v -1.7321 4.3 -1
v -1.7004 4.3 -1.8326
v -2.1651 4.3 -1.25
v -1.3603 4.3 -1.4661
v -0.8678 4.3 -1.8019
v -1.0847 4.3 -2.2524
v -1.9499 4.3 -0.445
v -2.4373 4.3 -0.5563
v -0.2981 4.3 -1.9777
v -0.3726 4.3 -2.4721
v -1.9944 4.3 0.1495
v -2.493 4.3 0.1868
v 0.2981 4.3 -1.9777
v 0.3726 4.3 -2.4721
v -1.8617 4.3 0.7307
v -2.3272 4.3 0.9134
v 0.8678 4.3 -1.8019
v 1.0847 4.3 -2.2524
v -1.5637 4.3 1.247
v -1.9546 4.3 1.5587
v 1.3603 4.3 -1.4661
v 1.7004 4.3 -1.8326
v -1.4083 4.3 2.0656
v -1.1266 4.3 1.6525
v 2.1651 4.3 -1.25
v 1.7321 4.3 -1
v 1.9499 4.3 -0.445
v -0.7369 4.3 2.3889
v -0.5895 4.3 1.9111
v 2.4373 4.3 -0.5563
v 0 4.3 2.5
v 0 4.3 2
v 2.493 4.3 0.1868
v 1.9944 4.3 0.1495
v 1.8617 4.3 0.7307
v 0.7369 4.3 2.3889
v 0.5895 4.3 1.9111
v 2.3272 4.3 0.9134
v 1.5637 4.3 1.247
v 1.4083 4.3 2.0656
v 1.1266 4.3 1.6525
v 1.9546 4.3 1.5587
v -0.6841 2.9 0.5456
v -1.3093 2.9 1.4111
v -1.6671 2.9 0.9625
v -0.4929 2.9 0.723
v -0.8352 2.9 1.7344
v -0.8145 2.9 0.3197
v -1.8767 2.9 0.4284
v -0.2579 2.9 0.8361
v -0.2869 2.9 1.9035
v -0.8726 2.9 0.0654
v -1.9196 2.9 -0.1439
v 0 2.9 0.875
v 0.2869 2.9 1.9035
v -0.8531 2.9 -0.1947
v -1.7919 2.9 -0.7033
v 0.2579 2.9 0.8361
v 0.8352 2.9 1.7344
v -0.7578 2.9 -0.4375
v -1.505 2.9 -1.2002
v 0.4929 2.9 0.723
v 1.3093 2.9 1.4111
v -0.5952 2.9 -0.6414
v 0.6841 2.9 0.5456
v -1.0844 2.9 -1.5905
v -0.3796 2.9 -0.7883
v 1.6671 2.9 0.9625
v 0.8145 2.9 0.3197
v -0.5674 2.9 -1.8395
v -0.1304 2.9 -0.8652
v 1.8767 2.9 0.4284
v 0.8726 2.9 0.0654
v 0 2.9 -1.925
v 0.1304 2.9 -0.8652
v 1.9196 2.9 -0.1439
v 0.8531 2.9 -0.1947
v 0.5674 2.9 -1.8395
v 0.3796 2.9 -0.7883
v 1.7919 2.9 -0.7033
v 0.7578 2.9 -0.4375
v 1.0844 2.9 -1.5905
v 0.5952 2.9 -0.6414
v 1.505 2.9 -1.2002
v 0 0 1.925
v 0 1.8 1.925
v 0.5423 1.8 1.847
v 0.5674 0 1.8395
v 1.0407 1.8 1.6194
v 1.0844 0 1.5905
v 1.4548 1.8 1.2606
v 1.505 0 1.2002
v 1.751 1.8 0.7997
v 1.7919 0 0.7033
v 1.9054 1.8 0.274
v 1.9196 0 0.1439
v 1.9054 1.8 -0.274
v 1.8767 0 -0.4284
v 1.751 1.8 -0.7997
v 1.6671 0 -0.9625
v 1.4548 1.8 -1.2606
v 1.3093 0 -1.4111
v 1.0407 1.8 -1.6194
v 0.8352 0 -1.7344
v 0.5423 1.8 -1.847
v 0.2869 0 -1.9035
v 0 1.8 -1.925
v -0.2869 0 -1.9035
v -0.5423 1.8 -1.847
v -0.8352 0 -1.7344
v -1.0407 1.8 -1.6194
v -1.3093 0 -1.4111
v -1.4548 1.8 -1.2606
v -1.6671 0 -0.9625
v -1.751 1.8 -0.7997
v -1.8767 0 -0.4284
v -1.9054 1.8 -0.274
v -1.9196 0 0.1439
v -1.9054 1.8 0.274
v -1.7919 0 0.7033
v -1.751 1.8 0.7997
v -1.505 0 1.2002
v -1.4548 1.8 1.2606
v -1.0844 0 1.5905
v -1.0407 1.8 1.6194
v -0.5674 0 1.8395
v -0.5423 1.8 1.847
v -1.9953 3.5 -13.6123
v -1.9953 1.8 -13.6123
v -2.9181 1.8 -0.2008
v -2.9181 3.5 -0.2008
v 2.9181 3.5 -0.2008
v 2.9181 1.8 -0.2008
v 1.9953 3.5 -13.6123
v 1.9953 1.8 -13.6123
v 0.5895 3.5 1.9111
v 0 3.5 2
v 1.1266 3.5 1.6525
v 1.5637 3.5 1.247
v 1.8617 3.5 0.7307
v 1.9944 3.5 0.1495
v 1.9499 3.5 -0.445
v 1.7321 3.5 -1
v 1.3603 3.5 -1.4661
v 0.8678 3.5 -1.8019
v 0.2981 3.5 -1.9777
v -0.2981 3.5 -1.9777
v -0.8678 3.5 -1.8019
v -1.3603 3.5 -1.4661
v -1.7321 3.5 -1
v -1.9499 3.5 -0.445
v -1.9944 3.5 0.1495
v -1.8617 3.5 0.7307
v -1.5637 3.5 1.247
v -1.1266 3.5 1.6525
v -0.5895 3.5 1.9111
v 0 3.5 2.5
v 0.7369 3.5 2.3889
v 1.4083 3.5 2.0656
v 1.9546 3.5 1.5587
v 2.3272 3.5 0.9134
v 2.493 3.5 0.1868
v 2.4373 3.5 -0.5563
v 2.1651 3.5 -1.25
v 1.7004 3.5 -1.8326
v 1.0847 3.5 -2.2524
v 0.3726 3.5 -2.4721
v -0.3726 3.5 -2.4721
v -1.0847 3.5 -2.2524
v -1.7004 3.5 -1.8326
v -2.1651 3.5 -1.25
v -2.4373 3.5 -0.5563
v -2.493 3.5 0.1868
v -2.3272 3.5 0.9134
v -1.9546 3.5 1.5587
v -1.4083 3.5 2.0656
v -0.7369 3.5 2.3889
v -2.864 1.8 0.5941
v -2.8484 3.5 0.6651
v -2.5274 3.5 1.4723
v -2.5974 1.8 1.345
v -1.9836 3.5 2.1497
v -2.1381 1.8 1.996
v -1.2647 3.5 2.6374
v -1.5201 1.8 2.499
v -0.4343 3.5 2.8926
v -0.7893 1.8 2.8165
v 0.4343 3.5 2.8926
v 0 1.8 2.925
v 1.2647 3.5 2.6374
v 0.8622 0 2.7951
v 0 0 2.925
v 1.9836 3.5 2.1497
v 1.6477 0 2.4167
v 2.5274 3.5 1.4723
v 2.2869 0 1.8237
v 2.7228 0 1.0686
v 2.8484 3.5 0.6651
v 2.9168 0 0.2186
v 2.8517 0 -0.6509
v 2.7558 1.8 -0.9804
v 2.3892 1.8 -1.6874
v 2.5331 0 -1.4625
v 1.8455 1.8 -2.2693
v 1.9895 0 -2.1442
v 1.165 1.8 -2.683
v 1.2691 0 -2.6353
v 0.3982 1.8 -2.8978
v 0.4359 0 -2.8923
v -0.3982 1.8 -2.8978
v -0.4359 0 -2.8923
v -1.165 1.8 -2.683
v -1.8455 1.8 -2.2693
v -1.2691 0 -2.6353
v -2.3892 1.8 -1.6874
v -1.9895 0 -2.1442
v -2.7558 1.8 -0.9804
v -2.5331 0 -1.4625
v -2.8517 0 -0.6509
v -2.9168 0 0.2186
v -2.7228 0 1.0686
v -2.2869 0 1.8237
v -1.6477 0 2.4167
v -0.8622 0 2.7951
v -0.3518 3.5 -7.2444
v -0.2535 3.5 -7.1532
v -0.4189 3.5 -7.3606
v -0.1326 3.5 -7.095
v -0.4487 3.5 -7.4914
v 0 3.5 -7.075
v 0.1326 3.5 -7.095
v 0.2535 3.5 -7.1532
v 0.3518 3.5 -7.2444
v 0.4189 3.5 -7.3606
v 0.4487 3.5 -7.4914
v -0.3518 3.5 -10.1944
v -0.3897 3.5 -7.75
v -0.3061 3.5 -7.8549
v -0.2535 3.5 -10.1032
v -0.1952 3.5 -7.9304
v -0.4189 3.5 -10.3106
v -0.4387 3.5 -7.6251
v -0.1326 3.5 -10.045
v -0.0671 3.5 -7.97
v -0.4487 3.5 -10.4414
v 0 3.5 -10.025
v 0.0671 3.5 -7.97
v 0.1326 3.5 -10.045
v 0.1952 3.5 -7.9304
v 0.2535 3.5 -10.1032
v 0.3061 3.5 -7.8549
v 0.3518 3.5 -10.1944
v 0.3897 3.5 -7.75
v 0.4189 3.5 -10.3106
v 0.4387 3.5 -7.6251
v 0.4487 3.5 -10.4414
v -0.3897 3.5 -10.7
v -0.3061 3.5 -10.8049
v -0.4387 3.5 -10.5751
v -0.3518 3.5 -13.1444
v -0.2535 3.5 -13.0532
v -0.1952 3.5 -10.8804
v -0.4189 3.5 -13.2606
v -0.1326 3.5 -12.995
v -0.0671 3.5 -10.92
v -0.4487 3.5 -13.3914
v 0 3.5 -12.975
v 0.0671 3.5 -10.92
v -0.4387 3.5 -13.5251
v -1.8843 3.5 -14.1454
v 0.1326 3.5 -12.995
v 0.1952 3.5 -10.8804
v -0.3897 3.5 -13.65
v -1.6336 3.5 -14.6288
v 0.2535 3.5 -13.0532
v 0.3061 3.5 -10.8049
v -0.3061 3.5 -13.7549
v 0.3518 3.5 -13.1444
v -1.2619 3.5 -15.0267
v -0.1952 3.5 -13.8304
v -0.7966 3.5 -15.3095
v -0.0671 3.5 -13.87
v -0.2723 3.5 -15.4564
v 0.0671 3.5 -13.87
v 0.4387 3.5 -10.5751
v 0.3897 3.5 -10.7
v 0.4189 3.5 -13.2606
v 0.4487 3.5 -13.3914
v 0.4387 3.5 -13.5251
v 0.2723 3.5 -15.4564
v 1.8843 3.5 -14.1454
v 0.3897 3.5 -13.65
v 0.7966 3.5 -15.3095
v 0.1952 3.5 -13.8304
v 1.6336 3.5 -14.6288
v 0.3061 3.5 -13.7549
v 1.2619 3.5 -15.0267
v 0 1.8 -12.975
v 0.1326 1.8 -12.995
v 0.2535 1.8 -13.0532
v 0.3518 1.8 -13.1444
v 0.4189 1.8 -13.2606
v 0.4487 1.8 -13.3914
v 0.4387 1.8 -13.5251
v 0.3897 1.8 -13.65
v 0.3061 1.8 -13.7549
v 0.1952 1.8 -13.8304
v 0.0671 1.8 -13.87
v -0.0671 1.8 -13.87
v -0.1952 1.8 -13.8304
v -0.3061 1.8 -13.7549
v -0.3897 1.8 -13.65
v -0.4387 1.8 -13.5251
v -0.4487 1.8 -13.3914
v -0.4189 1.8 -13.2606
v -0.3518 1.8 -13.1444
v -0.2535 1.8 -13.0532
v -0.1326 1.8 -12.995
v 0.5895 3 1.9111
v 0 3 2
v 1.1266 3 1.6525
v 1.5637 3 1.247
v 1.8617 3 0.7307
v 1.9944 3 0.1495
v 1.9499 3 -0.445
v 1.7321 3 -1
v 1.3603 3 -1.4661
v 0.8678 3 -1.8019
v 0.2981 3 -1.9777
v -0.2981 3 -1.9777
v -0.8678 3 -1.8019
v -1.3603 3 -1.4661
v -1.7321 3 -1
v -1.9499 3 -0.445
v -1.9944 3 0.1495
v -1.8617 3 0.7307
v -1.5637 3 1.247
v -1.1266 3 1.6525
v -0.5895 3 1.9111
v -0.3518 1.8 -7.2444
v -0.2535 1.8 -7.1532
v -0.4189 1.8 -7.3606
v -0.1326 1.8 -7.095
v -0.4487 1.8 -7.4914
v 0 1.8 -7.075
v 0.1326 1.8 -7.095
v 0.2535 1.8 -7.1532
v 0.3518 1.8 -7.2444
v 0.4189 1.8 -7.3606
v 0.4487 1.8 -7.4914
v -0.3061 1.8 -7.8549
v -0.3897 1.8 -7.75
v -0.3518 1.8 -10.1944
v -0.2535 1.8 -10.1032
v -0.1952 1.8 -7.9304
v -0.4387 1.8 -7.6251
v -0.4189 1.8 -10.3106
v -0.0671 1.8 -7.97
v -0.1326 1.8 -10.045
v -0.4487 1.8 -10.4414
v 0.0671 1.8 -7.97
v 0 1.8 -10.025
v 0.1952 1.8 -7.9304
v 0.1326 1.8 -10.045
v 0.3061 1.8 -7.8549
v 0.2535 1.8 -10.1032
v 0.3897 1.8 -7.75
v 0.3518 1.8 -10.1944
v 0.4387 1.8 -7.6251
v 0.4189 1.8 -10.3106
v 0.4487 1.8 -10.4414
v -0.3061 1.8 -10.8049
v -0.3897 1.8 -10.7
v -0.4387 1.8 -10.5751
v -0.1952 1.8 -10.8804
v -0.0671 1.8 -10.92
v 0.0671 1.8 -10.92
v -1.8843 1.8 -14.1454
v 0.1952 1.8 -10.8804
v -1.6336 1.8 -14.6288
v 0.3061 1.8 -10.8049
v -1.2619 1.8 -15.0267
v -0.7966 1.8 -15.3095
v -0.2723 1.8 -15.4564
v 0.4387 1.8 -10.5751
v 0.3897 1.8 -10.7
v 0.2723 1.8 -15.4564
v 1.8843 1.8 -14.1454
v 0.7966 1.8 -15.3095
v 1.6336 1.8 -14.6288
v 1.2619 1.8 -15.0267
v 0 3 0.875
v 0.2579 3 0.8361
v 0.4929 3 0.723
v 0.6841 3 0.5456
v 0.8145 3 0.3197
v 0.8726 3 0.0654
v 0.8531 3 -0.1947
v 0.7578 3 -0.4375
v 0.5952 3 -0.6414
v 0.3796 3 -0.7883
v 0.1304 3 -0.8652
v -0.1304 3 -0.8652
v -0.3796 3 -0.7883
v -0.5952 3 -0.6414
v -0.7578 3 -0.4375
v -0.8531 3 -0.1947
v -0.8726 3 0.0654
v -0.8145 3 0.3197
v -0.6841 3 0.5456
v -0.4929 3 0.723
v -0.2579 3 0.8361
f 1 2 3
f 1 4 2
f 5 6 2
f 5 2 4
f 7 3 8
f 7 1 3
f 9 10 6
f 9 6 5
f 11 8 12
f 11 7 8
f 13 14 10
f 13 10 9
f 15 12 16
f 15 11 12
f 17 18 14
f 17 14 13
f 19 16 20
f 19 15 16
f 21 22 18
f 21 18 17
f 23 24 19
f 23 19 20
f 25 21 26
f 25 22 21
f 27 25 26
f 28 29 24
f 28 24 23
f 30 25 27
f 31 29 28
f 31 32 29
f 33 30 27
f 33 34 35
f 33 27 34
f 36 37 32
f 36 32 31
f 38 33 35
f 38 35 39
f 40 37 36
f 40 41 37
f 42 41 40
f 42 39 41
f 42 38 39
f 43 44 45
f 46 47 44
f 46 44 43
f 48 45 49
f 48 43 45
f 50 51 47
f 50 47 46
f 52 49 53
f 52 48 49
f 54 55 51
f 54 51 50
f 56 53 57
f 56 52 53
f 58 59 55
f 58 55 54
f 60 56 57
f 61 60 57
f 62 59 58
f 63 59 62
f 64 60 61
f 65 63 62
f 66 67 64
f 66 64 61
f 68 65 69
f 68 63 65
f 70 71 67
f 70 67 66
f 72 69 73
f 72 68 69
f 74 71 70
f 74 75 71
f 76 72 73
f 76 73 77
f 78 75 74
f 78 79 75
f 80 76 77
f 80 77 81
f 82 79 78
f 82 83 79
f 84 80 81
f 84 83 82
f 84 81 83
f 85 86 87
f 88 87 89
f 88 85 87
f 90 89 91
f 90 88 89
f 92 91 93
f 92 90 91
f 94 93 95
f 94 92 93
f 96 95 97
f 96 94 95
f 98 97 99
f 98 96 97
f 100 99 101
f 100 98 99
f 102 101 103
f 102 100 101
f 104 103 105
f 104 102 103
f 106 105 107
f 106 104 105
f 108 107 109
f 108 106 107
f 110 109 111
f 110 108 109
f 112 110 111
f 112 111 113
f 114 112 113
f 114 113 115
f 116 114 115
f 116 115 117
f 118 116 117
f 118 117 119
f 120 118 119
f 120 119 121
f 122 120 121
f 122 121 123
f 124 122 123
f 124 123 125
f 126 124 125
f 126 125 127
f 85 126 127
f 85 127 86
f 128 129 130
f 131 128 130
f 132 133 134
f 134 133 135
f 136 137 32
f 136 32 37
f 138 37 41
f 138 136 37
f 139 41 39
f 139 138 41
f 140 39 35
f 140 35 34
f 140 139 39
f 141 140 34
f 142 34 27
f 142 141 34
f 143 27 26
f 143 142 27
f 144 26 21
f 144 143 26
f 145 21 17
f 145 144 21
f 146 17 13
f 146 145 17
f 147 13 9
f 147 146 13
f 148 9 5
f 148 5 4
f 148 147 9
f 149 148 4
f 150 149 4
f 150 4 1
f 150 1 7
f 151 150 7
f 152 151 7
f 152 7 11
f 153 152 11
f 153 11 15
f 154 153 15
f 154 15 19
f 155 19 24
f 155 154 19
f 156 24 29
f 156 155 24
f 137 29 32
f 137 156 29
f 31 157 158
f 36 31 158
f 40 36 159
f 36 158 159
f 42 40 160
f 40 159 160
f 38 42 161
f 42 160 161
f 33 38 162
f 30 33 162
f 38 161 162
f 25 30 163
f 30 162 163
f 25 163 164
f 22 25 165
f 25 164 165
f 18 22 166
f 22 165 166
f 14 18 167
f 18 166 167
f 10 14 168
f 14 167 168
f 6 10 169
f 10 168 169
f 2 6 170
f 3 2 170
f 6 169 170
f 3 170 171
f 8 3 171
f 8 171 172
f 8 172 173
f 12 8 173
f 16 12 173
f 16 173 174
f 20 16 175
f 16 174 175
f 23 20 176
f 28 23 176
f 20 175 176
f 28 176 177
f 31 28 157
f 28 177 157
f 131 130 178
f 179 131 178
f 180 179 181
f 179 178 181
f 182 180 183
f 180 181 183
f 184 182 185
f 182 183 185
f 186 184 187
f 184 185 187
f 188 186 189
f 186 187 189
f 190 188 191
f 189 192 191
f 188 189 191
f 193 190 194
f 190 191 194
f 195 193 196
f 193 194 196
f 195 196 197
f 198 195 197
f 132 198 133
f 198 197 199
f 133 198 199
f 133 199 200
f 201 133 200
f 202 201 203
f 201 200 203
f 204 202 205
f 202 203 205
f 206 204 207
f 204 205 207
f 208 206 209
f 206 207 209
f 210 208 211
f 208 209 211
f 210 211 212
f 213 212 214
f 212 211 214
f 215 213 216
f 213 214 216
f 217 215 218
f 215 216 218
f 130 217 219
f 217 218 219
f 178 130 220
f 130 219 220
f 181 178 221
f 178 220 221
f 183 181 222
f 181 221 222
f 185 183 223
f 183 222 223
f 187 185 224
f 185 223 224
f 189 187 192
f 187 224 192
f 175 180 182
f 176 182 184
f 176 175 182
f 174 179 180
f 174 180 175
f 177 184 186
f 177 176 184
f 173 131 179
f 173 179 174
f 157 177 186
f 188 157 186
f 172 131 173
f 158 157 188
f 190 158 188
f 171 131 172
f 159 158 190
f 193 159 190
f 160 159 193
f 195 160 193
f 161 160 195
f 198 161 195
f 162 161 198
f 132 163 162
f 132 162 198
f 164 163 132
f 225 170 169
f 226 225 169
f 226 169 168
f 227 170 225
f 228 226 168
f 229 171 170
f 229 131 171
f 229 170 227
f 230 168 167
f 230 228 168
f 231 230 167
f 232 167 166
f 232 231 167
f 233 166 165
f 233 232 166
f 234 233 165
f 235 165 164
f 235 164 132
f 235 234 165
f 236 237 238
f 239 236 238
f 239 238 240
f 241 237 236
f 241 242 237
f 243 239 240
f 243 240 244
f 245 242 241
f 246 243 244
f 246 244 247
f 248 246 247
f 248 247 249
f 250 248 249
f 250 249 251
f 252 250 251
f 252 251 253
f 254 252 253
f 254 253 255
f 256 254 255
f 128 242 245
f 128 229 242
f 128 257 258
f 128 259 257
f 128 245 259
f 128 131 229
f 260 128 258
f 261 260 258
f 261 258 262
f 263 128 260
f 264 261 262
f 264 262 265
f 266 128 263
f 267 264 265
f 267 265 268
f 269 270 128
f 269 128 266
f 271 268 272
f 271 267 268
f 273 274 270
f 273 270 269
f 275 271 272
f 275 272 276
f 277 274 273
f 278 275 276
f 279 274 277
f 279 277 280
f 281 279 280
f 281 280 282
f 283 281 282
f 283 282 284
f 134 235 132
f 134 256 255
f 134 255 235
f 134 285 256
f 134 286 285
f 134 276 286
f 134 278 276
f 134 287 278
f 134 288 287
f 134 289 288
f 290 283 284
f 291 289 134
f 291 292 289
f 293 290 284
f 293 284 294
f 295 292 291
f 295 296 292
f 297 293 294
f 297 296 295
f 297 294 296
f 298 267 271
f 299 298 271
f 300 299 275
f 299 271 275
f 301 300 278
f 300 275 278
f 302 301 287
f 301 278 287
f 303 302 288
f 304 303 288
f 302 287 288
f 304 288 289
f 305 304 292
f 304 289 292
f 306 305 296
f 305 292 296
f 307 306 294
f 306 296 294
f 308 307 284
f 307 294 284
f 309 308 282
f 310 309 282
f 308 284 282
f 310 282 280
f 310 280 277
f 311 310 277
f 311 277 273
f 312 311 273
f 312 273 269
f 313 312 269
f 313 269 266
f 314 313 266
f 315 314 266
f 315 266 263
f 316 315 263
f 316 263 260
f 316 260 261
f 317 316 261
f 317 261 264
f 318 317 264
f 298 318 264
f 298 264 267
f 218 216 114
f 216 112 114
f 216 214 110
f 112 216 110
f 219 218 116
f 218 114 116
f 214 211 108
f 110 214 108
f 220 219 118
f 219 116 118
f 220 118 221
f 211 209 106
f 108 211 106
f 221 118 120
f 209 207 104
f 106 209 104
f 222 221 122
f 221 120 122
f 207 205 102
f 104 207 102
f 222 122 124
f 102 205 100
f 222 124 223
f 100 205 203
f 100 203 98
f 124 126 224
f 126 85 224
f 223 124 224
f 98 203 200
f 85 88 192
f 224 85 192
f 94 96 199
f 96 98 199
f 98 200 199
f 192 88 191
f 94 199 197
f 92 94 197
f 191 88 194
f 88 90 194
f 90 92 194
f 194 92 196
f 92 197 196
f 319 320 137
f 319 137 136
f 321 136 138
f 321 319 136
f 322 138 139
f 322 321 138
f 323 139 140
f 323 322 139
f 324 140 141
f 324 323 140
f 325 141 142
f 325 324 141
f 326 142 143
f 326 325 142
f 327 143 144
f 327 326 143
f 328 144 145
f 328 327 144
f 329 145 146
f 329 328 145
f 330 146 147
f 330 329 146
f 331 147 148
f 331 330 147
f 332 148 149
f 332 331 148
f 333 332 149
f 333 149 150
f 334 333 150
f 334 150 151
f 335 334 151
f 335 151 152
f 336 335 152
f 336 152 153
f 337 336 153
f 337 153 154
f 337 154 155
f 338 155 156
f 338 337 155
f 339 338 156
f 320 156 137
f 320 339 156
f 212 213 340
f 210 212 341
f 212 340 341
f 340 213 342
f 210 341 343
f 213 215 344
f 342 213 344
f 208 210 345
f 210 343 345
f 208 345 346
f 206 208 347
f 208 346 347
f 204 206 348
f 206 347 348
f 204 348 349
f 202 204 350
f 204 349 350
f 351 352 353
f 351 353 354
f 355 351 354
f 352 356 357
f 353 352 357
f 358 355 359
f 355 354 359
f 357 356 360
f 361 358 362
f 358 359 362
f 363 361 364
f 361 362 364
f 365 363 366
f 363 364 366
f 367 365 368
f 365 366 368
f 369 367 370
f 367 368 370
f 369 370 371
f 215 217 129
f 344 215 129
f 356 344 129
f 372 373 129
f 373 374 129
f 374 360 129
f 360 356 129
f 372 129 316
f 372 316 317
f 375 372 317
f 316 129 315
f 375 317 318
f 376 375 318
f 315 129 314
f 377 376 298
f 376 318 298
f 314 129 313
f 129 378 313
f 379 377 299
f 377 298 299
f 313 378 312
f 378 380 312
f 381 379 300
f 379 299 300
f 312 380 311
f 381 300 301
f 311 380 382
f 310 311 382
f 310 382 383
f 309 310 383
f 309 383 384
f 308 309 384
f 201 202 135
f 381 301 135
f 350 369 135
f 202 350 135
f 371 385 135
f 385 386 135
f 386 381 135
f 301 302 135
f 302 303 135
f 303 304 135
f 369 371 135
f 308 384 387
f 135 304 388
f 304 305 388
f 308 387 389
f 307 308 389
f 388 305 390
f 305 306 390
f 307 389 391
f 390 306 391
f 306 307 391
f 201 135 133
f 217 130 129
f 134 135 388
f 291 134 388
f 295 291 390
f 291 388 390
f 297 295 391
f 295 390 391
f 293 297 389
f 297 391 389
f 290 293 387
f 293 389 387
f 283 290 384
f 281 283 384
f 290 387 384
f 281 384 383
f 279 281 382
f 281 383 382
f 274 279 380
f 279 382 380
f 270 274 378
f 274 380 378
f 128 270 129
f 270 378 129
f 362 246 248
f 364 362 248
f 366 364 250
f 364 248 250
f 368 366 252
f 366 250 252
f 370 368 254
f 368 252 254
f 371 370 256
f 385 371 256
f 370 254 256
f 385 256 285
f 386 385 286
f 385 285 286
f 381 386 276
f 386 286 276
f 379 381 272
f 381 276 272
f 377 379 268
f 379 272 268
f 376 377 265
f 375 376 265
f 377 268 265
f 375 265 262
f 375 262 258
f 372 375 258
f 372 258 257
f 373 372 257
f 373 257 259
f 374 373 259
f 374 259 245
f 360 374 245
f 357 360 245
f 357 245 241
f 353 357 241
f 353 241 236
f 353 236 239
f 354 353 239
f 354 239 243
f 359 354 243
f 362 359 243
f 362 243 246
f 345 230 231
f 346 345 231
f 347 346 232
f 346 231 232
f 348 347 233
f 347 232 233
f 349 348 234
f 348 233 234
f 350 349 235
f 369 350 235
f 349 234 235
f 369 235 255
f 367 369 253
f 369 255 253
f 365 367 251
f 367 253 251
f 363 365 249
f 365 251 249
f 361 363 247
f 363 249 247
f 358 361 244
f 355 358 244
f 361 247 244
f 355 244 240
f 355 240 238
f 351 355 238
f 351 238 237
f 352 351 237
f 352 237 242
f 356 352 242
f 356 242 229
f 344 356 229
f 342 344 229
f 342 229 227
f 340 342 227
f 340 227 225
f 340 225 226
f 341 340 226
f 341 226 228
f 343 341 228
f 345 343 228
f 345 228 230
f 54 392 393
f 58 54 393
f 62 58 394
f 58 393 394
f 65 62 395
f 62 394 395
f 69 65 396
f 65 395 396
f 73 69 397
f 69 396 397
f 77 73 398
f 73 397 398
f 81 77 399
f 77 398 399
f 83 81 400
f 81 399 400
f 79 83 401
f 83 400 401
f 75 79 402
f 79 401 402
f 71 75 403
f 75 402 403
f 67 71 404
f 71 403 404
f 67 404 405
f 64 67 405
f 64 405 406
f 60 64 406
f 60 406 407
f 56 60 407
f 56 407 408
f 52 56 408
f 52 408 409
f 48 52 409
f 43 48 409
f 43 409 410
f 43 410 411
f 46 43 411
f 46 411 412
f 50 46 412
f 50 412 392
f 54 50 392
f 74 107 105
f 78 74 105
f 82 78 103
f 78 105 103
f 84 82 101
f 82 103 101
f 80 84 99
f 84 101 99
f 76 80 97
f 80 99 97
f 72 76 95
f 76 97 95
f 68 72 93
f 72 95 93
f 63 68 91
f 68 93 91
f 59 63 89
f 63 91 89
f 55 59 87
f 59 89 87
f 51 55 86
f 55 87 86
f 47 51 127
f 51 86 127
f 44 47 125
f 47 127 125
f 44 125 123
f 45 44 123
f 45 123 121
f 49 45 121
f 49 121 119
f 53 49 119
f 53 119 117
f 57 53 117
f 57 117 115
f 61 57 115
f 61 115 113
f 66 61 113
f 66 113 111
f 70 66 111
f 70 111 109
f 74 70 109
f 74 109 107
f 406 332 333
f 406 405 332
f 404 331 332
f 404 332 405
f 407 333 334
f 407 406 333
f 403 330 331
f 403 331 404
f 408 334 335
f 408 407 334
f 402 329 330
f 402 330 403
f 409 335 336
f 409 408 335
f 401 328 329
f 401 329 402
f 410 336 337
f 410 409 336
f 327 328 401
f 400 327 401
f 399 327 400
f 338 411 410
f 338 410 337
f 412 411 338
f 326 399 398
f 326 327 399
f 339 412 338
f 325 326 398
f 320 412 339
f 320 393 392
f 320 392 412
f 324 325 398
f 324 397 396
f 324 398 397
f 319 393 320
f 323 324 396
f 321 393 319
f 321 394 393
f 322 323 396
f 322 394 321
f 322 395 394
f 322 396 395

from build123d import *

# Parameters (mm, degrees)
SKETCH1_R           = 2.925
SKETCH1_R_2         = 1.925
BOSS_EXTRUDE1_DEPTH = 1.8
BOSS_EXTRUDE2_DEPTH = 1.7
SKETCH4_R           = 2.5
SKETCH4_R_2         = 2
BOSS_EXTRUDE3_DEPTH = 0.8
SKETCH5_R           = 0.45
CUT_EXTRUDE1_DEPTH  = 17.133234332
SKETCH6_R           = 0.875
CUT_EXTRUDE2_DEPTH  = 17.133234332
SKETCH7_R           = 1.925
CUT_EXTRUDE3_DEPTH  = 1.1
CUT_EXTRUDE4_START  = -0.5
SKETCH8_R           = 2
CUT_EXTRUDE4_DEPTH  = 0.5


with BuildPart() as part:
    # Sketch1 → Boss-Extrude1 (new body)
    with BuildSketch(Plane(origin=(0, 0, 0), x_dir=(1, 0, 0), z_dir=(0, 1, 0))):
        with Locations(Location((0, 0, 0), (0, 0, 270))):
            Circle(SKETCH1_R)
        with Locations(Location((0, 0, 0), (0, 0, 270))):
            Circle(SKETCH1_R_2, mode=Mode.SUBTRACT)
    extrude(amount=BOSS_EXTRUDE1_DEPTH)

    # Sketch3 → Boss-Extrude2 (add)
    with BuildSketch(Plane(origin=(0, 1.8, 0), x_dir=(1, 0, 0), z_dir=(0, 1, 0))):
        with BuildLine():
            Line((2.918100235, 0.200788497), (1.995282212, 13.61229128))
            ThreePointArc((1.995282212, 13.61229128), (0, 15.475), (-1.995282212, 13.61229128))
            Line((-1.995282212, 13.61229128), (-2.918100235, 0.200788497))
            ThreePointArc((-2.918100235, 0.200788497), (0, -2.925), (2.918100235, 0.200788497))
        make_face()
    extrude(amount=BOSS_EXTRUDE2_DEPTH)

    # Sketch4 → Boss-Extrude3 (add)
    with BuildSketch(Plane(origin=(0, 3.5, 0), x_dir=(1, 0, 0), z_dir=(0, 1, 0))):
        with Locations(Location((0, 0, 0), (0, 0, 270))):
            Circle(SKETCH4_R)
        with Locations(Location((0, 0, 0), (0, 0, 270))):
            Circle(SKETCH4_R_2, mode=Mode.SUBTRACT)
    extrude(amount=BOSS_EXTRUDE3_DEPTH)

    # Sketch5 → Cut-Extrude1 (cut, through all)
    with BuildSketch(Plane(origin=(0, 3.5, 0), x_dir=(1, 0, 0), z_dir=(0, 1, 0))):
        with Locations(Location((0, 13.425, 0), (0, 0, 270))):
            Circle(SKETCH5_R)
        with Locations(Location((0, 10.475, 0), (0, 0, 270))):
            Circle(SKETCH5_R)
        with Locations(Location((0, 7.525, 0), (0, 0, 270))):
            Circle(SKETCH5_R)
    extrude(amount=-CUT_EXTRUDE1_DEPTH, mode=Mode.SUBTRACT)

    # Sketch6 → Cut-Extrude2 (cut, through all)
    with BuildSketch(Plane(origin=(0, 3.5, 0), x_dir=(1, 0, 0), z_dir=(0, 1, 0))):
        with Locations(Location((0, 0, 0), (0, 0, 270))):
            Circle(SKETCH6_R)
    extrude(amount=-CUT_EXTRUDE2_DEPTH, mode=Mode.SUBTRACT)

    # Sketch7 → Cut-Extrude3 (cut)
    with BuildSketch(Plane.XZ.offset(-1.8)):
        with Locations(Location((0, 0, 0), (0, 0, 270))):
            Circle(SKETCH7_R)
    extrude(amount=-CUT_EXTRUDE3_DEPTH, mode=Mode.SUBTRACT)

    # Sketch8 → Cut-Extrude4 (cut)
    with BuildSketch(Plane(origin=(0, 3.5, 0), x_dir=(1, 0, 0), z_dir=(0, 1, 0)).offset(CUT_EXTRUDE4_START)):
        with Locations(Location((0, 0, 0), (0, 0, 270))):
            Circle(SKETCH8_R)
    extrude(amount=CUT_EXTRUDE4_DEPTH, mode=Mode.SUBTRACT)


solid = part.part
